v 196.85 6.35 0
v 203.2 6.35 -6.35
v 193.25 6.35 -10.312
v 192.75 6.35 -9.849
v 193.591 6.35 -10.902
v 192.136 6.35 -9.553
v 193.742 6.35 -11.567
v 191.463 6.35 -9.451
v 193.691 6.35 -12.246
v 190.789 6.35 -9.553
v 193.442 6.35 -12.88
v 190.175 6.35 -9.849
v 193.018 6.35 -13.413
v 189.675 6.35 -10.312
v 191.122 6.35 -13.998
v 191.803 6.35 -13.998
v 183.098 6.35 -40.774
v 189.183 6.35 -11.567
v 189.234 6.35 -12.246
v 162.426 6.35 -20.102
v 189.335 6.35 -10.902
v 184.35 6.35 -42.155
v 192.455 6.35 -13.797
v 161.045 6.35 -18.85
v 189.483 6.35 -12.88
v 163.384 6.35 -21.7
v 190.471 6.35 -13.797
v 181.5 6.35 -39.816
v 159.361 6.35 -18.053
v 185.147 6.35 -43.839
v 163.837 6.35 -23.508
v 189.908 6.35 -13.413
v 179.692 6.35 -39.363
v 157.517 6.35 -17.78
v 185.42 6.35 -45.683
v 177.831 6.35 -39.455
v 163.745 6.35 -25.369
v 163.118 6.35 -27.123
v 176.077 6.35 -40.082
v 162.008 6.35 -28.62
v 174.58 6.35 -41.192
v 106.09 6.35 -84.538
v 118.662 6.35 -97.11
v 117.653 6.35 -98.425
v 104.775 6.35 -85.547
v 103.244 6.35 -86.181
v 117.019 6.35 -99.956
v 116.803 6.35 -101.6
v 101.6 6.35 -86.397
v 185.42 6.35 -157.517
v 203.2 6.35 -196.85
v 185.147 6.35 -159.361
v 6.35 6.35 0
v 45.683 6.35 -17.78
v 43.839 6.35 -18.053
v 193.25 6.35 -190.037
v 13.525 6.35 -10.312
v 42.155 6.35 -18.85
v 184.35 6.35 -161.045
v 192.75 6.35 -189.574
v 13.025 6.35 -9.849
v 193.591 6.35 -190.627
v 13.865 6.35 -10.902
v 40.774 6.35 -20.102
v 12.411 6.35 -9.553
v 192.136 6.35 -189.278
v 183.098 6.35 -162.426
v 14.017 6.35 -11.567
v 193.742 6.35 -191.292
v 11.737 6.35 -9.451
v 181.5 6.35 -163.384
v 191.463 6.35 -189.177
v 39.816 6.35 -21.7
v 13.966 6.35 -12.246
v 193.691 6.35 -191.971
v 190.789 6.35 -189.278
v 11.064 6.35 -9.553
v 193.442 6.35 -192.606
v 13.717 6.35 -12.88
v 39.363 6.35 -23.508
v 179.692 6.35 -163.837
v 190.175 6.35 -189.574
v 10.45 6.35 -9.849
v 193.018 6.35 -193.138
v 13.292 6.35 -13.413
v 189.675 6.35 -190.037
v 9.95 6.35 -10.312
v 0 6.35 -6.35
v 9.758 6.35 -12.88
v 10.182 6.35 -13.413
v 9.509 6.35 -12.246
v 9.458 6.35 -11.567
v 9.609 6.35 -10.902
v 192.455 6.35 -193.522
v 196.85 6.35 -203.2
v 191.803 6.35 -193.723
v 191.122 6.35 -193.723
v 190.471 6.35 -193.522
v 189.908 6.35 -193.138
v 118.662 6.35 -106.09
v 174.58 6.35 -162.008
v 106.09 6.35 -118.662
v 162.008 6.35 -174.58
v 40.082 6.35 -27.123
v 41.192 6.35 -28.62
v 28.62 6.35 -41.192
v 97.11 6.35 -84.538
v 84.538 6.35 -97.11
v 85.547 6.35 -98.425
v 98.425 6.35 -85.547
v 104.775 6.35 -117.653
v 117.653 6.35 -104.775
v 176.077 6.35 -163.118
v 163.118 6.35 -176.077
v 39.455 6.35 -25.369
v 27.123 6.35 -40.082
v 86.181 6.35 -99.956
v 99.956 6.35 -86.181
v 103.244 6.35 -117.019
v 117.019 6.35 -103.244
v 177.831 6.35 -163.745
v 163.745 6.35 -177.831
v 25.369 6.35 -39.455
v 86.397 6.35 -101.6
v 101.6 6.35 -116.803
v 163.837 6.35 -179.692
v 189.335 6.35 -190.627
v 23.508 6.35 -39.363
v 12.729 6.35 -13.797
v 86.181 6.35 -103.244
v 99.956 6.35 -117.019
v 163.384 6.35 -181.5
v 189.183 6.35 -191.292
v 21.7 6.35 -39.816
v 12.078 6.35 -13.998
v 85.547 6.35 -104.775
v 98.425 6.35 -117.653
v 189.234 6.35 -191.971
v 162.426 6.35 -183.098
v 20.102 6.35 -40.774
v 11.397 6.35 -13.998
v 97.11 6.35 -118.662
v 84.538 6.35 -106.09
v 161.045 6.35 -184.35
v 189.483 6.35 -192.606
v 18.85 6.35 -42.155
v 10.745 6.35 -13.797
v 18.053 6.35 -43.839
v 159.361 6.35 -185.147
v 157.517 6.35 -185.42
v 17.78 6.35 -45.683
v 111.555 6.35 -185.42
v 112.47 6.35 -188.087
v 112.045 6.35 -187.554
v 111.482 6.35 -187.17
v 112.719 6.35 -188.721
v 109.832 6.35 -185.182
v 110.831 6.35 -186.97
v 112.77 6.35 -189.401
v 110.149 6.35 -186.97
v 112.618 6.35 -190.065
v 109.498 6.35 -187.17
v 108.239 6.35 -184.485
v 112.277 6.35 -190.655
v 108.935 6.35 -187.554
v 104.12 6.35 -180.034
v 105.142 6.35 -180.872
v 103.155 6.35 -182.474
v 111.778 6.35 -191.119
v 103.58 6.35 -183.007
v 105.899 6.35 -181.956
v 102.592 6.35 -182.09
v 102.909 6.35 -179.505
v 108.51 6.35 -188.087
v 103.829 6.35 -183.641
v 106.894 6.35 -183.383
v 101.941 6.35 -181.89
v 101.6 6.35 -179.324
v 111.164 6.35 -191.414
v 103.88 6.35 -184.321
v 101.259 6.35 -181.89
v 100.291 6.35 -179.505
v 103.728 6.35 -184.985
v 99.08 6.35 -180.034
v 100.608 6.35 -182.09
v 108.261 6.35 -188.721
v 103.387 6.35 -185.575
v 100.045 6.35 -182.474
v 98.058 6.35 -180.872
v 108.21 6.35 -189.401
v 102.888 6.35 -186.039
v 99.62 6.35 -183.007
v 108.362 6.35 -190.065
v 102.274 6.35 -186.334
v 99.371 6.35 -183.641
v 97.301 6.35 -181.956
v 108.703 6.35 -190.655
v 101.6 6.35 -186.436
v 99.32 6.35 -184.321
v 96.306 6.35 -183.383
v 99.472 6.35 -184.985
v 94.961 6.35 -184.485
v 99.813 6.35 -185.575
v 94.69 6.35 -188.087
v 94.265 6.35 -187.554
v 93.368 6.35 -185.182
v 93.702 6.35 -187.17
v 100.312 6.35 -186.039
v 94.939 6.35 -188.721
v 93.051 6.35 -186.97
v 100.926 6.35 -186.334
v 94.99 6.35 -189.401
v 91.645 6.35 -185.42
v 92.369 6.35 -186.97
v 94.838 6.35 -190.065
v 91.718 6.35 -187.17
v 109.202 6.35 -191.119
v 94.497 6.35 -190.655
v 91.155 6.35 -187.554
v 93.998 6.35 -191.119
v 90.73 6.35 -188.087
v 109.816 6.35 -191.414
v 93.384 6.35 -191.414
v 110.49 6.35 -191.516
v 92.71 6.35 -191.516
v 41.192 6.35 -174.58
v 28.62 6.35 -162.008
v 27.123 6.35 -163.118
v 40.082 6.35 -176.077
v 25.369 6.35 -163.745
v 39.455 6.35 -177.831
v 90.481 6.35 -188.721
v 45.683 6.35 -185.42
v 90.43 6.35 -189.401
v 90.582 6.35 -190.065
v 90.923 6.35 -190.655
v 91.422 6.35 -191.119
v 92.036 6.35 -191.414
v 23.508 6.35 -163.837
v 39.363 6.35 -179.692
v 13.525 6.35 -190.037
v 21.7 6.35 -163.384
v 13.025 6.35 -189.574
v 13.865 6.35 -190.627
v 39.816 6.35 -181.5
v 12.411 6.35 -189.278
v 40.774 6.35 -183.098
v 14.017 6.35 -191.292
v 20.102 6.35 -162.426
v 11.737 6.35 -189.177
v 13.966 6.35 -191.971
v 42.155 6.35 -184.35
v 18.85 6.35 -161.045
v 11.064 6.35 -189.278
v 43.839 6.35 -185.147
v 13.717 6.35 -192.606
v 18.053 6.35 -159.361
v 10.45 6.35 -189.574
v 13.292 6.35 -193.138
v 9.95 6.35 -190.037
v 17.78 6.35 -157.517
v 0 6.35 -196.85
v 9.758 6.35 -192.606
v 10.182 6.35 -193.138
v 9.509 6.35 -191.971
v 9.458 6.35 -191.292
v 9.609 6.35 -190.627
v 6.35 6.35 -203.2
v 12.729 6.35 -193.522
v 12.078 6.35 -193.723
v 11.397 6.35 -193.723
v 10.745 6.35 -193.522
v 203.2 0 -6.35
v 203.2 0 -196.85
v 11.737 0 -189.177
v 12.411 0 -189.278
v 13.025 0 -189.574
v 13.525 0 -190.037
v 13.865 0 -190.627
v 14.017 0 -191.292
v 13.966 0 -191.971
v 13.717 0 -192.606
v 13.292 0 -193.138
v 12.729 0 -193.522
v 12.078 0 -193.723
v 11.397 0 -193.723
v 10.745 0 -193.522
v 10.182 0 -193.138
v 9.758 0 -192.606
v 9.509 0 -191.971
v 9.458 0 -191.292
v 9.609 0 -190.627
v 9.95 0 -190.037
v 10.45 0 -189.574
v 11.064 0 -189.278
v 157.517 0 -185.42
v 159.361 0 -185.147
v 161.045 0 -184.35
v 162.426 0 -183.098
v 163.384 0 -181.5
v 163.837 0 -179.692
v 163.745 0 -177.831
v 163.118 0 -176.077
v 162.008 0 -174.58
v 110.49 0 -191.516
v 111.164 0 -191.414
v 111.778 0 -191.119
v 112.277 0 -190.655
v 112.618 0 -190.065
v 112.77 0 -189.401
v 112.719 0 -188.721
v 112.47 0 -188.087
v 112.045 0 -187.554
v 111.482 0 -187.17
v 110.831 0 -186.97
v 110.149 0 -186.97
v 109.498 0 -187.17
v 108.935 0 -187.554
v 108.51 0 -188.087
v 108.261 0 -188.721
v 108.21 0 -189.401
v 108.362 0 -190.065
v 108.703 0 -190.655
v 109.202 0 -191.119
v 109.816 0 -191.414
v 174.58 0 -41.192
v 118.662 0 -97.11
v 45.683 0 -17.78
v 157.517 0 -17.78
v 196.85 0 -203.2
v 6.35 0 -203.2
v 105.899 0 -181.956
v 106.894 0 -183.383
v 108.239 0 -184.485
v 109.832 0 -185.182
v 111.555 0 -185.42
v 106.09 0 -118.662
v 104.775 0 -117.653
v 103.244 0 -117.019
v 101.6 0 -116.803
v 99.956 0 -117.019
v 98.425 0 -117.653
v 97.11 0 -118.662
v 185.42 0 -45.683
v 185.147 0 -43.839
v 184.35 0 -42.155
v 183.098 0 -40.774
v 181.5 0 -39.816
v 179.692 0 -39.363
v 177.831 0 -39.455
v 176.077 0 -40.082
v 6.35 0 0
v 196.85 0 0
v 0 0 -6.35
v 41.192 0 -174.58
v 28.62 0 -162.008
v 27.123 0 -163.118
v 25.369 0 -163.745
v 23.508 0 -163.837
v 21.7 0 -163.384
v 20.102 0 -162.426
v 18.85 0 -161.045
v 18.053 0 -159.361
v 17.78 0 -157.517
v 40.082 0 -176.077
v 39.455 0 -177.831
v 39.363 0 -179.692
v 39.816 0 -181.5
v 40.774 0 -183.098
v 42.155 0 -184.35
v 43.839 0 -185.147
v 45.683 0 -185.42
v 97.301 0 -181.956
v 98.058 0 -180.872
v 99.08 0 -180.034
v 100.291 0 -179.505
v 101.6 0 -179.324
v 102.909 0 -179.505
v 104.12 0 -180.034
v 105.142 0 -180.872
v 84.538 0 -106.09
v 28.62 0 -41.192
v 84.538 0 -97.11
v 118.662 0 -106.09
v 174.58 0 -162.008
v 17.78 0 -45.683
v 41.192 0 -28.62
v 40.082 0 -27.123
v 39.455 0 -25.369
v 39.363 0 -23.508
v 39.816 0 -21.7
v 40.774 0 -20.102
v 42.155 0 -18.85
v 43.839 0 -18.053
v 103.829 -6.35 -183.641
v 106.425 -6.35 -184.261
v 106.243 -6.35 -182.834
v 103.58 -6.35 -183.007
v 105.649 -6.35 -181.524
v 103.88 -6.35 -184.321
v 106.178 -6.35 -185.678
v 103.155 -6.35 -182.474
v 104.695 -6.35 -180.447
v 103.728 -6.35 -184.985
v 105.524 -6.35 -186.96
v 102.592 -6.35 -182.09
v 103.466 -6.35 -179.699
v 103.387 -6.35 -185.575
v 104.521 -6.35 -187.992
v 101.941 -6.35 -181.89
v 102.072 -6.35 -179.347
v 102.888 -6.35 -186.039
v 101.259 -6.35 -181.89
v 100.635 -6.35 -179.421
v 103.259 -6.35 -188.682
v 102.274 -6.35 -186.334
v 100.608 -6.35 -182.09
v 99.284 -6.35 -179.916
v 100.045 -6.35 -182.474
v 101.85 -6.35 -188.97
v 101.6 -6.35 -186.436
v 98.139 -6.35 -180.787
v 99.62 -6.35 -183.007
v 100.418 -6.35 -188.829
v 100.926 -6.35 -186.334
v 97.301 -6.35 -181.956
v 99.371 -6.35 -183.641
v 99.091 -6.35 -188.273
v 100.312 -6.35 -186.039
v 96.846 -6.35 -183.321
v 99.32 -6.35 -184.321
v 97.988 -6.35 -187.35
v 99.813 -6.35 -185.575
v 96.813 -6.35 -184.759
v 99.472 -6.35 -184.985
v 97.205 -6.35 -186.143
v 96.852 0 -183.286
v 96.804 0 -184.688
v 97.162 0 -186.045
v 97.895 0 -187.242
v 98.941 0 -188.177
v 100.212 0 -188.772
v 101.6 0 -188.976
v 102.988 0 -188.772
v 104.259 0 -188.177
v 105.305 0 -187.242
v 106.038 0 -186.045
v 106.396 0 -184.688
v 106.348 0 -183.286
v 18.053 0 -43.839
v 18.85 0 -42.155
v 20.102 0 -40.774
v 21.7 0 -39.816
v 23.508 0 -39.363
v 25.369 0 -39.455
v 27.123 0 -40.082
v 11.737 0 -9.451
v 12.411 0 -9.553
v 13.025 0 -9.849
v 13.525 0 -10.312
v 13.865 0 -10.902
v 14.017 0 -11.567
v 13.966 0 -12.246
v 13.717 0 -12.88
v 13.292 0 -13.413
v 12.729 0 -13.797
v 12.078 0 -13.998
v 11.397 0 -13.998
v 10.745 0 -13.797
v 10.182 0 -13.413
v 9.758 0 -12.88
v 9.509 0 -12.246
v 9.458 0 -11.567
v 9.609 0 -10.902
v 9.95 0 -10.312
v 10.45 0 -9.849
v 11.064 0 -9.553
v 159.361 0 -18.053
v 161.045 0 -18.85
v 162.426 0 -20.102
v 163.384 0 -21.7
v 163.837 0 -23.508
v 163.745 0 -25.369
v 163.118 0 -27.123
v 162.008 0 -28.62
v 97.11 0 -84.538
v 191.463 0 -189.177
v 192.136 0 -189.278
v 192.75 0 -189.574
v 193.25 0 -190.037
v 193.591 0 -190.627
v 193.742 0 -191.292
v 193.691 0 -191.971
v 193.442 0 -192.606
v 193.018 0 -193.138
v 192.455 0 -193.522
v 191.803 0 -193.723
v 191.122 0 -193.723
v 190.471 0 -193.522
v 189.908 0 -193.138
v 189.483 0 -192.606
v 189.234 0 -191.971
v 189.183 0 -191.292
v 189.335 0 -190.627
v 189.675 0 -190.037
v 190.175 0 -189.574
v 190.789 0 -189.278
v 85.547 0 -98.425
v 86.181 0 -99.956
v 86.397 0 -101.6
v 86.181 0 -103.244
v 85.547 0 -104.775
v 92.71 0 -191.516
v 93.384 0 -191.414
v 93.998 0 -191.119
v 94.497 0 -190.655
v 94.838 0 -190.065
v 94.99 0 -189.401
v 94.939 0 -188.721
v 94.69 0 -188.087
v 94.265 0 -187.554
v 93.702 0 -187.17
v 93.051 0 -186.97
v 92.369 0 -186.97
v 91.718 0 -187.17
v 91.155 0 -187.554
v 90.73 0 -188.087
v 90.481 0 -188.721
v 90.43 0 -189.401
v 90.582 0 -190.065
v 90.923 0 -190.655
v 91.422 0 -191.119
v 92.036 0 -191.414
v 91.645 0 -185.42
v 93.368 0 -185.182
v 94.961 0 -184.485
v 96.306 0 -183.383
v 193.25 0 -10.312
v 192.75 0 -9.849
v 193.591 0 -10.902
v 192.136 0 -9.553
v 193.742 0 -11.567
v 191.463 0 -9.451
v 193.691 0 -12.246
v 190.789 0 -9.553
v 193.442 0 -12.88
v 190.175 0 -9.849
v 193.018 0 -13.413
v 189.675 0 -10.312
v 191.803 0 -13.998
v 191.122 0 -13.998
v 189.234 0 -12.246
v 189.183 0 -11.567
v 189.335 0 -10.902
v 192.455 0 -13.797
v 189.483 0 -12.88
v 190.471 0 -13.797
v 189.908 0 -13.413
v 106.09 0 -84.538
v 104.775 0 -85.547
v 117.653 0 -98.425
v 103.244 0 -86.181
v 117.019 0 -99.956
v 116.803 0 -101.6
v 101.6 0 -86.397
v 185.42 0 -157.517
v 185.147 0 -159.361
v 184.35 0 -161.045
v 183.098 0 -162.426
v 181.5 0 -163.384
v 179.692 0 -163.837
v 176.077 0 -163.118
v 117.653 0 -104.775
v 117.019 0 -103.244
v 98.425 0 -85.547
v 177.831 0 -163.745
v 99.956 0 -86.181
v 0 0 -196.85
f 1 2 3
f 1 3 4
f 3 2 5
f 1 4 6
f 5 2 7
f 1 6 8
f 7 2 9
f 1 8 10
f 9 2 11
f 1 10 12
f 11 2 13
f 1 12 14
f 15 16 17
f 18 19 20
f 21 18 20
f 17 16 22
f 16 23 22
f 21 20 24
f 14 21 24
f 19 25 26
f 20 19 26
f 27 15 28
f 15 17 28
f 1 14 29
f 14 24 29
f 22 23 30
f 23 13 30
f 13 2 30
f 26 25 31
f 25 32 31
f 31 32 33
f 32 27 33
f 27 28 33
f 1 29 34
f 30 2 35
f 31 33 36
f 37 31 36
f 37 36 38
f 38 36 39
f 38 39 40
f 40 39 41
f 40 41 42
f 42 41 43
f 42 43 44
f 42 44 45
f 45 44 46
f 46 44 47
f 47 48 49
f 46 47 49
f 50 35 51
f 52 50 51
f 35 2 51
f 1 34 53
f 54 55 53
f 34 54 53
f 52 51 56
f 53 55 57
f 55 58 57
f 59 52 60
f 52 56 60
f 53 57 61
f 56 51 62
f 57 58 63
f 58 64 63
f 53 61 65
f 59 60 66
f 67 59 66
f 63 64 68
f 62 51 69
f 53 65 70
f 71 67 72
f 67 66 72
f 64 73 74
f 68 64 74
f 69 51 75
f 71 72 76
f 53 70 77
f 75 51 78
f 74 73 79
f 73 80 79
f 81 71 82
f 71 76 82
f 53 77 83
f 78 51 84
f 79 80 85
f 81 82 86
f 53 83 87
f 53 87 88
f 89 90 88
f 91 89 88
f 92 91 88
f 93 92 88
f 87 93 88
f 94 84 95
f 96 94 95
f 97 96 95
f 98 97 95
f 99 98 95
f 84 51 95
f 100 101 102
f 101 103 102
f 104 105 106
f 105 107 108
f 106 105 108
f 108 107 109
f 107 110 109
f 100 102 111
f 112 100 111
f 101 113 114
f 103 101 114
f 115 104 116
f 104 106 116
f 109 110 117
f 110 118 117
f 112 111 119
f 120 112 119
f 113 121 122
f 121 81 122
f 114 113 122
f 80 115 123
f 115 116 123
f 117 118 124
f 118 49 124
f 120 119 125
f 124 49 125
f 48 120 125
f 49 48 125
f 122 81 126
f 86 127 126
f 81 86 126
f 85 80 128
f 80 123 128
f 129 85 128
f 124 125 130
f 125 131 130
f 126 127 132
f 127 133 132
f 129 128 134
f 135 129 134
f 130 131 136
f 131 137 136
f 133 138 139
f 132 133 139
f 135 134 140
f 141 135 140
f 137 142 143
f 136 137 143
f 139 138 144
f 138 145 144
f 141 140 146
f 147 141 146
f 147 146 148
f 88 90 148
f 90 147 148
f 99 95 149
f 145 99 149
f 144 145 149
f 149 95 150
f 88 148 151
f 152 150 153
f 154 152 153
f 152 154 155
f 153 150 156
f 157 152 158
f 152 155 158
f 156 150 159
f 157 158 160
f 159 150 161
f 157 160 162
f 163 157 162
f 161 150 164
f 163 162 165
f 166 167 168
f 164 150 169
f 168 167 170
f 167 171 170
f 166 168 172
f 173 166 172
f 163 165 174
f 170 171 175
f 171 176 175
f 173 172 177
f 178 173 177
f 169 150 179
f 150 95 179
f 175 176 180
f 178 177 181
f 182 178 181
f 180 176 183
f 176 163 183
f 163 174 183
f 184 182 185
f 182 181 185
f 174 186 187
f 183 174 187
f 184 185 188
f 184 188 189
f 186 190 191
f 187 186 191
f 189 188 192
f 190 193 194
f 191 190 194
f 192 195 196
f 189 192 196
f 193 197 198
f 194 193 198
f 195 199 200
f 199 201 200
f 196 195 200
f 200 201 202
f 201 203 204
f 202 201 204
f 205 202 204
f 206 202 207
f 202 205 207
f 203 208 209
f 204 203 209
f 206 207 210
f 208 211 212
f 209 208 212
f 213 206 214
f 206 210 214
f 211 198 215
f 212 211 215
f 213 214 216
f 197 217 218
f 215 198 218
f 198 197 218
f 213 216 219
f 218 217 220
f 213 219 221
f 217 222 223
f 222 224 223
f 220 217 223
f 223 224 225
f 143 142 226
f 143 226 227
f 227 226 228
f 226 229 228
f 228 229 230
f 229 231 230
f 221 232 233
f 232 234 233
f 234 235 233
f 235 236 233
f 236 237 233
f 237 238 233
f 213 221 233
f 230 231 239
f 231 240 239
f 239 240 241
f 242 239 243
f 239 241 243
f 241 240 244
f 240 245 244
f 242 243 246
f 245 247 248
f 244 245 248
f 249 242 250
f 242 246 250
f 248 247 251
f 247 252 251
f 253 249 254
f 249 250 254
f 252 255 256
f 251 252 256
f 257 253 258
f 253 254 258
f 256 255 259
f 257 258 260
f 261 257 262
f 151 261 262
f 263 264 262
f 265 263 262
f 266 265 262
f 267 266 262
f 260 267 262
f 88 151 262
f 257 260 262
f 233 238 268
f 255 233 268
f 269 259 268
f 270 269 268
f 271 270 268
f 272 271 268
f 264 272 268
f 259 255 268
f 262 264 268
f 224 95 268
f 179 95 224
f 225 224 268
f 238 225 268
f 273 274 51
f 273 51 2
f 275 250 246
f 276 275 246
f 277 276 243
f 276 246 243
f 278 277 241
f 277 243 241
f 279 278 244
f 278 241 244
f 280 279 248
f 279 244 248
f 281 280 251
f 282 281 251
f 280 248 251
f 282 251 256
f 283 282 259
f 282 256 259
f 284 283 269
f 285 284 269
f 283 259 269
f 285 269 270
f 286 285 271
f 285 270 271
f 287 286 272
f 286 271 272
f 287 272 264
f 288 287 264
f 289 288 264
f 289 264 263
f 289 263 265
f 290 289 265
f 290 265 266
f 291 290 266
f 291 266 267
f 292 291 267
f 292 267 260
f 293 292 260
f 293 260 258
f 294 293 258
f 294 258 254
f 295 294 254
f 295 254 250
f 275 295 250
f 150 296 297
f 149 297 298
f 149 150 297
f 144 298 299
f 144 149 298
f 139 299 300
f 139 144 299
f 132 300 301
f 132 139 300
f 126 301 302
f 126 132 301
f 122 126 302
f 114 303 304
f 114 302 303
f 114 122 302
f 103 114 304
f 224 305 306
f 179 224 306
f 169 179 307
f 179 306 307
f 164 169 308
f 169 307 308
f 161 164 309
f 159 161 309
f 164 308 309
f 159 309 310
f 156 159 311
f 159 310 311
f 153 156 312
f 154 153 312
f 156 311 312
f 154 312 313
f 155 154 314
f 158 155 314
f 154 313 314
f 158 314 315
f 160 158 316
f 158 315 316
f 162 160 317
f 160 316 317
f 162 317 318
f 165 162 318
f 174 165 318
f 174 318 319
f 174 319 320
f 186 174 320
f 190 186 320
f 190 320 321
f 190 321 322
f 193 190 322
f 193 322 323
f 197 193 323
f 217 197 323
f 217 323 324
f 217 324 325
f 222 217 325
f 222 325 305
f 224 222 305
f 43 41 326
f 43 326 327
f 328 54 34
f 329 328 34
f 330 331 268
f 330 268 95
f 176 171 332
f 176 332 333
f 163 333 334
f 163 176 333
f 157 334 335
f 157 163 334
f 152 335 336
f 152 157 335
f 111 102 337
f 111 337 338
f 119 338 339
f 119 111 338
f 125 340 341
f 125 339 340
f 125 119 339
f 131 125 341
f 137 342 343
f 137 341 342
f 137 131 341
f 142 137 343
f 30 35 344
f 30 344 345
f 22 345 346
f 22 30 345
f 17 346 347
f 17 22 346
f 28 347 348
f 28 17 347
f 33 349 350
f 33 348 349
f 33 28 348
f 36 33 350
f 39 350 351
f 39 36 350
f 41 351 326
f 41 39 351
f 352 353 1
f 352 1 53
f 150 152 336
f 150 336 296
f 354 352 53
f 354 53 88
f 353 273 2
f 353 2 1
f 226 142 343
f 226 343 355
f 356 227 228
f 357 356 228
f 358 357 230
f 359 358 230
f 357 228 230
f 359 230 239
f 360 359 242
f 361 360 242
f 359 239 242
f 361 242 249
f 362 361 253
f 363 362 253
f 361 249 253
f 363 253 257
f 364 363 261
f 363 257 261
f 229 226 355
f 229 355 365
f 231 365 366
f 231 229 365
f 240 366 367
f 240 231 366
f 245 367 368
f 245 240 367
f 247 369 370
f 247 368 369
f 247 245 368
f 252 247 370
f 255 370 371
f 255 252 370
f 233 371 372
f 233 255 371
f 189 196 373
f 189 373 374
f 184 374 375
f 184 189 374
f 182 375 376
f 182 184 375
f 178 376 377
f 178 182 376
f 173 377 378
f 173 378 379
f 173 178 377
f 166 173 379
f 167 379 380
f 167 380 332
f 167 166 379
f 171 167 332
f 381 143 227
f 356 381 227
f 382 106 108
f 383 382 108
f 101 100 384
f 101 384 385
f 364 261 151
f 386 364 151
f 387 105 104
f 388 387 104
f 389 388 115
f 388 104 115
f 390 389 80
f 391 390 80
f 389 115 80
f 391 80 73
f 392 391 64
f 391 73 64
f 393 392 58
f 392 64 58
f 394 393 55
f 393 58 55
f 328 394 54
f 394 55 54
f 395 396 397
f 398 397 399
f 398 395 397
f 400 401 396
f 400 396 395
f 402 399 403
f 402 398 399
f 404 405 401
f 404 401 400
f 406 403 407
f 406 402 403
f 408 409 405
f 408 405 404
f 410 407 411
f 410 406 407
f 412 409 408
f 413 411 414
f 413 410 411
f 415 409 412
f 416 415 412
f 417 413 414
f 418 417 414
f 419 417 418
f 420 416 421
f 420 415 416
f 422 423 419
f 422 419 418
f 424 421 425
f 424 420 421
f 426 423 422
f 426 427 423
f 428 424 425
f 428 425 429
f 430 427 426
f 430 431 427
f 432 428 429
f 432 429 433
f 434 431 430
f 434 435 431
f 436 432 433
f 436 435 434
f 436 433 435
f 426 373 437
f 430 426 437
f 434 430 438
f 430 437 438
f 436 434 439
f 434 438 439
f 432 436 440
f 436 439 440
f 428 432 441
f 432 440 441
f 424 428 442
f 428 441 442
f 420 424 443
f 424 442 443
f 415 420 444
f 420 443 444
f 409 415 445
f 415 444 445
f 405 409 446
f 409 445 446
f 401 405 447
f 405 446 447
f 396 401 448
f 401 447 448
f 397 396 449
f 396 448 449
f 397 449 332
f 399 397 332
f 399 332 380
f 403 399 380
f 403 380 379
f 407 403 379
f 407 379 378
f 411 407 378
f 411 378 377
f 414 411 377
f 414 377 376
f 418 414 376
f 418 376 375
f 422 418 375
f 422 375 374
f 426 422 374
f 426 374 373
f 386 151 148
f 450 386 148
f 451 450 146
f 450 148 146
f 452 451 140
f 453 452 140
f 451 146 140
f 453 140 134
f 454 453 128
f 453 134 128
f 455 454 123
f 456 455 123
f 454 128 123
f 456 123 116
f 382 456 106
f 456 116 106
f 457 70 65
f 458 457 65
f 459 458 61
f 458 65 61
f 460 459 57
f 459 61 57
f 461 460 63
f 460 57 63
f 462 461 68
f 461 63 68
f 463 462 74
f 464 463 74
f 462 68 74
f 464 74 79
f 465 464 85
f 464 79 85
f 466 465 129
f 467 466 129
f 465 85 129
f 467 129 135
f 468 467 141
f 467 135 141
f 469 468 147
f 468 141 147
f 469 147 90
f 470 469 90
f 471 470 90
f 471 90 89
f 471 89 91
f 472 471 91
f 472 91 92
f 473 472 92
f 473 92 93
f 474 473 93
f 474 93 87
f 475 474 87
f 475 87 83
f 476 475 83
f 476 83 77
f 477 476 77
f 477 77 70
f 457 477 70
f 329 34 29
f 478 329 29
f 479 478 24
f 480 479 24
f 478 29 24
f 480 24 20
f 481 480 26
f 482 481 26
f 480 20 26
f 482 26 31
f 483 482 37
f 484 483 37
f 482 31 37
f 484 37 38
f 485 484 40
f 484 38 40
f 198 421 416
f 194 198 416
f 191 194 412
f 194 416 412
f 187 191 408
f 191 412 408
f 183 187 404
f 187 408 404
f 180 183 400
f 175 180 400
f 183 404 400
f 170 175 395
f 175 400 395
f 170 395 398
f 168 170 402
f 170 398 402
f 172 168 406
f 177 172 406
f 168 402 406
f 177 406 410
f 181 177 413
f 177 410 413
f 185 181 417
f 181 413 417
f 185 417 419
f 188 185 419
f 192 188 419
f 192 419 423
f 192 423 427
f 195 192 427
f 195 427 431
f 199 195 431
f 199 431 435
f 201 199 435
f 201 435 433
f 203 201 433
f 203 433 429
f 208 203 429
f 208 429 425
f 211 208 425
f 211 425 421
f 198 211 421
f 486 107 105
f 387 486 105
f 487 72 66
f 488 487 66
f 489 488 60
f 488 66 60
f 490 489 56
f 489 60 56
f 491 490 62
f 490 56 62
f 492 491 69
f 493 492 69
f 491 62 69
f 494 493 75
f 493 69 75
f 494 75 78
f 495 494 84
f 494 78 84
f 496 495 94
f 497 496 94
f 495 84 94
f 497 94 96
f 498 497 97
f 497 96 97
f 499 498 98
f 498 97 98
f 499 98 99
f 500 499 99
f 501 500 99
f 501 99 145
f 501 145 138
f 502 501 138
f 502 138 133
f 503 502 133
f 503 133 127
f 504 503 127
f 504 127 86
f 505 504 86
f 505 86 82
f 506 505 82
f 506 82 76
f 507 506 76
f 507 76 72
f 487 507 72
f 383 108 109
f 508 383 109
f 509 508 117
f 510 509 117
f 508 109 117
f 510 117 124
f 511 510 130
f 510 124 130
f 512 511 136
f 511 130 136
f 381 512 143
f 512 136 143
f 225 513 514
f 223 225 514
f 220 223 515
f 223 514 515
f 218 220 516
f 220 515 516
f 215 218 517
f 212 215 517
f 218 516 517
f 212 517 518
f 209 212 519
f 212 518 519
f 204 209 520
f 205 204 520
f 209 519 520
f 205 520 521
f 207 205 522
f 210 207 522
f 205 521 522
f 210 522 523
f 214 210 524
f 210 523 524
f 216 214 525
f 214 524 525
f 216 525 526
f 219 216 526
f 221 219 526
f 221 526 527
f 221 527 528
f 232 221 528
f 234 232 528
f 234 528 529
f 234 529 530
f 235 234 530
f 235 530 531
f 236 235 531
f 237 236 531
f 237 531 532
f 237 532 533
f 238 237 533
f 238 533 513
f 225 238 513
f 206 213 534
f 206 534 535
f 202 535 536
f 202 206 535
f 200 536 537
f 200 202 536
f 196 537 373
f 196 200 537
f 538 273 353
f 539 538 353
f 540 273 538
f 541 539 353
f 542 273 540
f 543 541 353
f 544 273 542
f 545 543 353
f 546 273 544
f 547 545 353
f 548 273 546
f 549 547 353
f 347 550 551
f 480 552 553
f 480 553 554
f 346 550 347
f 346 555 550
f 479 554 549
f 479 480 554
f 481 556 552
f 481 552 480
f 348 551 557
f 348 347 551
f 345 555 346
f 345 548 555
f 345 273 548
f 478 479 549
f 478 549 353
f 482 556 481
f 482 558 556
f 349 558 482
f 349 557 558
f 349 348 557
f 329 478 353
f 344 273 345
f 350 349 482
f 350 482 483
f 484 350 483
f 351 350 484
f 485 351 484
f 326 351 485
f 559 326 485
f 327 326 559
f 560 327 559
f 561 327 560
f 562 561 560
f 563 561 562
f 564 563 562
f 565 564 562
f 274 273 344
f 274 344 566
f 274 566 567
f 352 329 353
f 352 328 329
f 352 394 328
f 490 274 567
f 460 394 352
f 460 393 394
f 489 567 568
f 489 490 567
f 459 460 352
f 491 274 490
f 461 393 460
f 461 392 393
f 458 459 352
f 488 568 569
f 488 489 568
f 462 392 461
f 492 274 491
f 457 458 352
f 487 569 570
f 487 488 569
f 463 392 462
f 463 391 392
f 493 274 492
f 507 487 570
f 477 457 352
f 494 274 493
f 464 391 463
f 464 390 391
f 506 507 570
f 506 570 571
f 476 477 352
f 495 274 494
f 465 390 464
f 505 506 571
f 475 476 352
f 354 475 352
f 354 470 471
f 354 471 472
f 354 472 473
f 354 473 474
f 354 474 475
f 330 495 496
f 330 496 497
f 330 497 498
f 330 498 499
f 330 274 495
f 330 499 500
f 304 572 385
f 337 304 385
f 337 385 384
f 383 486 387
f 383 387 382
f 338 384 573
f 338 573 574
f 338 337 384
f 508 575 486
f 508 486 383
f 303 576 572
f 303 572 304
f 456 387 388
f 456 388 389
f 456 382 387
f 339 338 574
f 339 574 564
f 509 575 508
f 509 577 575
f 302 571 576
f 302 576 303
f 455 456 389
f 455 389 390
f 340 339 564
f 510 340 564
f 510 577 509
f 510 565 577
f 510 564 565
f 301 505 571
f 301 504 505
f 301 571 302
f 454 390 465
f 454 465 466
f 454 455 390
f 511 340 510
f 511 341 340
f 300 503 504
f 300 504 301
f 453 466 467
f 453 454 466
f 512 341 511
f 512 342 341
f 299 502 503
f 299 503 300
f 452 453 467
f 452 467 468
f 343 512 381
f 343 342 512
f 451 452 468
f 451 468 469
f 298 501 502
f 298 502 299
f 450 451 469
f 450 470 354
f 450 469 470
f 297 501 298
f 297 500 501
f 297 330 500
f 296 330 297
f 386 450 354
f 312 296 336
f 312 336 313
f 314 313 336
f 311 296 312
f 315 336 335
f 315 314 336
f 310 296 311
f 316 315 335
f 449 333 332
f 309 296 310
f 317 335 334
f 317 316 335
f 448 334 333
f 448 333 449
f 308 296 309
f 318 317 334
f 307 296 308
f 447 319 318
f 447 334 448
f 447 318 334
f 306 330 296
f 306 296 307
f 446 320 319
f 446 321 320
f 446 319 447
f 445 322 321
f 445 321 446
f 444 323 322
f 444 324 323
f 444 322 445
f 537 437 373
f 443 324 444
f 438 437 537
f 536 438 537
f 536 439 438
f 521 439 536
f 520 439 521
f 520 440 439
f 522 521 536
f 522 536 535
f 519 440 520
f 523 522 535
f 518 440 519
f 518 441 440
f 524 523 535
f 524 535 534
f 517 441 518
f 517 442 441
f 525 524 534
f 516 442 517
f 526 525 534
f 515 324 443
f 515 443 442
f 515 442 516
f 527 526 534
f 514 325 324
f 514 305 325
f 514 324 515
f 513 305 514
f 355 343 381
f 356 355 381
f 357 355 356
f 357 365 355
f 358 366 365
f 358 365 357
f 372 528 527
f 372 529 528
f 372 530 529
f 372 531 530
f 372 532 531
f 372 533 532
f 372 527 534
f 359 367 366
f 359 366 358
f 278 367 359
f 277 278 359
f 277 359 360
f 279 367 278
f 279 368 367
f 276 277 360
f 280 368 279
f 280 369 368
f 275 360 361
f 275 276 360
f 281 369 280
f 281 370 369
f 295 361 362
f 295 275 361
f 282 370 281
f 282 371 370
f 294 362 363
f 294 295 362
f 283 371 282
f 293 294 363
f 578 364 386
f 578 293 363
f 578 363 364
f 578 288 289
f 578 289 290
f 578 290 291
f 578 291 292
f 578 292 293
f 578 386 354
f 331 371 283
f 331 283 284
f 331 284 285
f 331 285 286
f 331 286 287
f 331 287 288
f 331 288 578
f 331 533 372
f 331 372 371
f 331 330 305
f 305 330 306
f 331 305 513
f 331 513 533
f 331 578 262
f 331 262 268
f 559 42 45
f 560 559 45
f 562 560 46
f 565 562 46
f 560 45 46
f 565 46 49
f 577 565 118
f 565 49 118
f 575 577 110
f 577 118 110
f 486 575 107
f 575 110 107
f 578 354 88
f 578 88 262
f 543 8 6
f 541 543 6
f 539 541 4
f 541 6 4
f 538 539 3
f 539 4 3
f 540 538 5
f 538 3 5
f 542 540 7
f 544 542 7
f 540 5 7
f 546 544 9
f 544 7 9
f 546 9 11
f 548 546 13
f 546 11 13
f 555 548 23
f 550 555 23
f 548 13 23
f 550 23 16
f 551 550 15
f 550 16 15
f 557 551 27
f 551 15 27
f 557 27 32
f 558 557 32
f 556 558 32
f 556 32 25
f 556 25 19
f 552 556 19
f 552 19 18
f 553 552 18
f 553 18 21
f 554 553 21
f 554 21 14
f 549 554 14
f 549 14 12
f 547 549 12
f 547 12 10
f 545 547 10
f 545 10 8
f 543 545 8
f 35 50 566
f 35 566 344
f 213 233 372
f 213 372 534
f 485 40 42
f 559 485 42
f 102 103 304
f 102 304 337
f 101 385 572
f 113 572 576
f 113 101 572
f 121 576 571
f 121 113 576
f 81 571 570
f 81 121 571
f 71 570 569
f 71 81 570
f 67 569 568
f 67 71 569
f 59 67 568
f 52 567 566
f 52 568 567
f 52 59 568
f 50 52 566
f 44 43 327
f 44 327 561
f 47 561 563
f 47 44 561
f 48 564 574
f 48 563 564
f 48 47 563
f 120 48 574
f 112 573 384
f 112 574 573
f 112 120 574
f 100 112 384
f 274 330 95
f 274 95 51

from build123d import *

# Parameters (mm, degrees)
BOSS_EXTRUDE1_DEPTH = 6.35
CUT_EXTRUDE1_DEPTH  = 288.438345563
SKETCH3_R           = 2.286
CUT_EXTRUDE2_DEPTH  = 288.438345563
BOSS_EXTRUDE2_DEPTH = 6.35
SKETCH5_R           = 4.826
BOSS_EXTRUDE3_DEPTH = 6.35
SKETCH6_R           = 2.286
CUT_EXTRUDE3_DEPTH  = 288.648691984


with BuildPart() as part:
    # Sketch1 → Boss-Extrude1 (new body)
    with BuildSketch(Plane(origin=(0, 0, 0), x_dir=(1, 0, 0), z_dir=(0, 1, 0))):
        Polygon((0, 196.85), (6.35, 203.2), (196.85, 203.2), (203.2, 196.85), (203.2, 6.35), (196.85, 0), (6.35, 0), (0, 6.35), align=None)
    extrude(amount=BOSS_EXTRUDE1_DEPTH)

    # Sketch2 → Cut-Extrude1 (cut, through all)
    with BuildSketch(Plane(origin=(0, 6.35, 0), x_dir=(1, 0, 0), z_dir=(0, 1, 0))):
        with BuildLine():
            Line((45.682614691, 185.42), (157.517385309, 185.42))
            ThreePointArc((157.517385309, 185.42), (163.384020341, 181.500039796), (162.00751337, 174.579871939))
            Line((162.00751337, 174.579871939), (106.090128061, 118.66248663))
            ThreePointArc((106.090128061, 118.66248663), (101.6, 116.802614691), (97.109871939, 118.66248663))
            Line((97.109871939, 118.66248663), (41.19248663, 174.579871939))
            ThreePointArc((41.19248663, 174.579871939), (39.815979659, 181.500039796), (45.682614691, 185.42))
        make_face()
        with BuildLine():
            Line((17.78, 157.517385309), (17.78, 45.682614691))
            ThreePointArc((17.78, 45.682614691), (21.699960204, 39.815979659), (28.620128061, 41.19248663))
            Line((28.620128061, 41.19248663), (84.53751337, 97.109871939))
            ThreePointArc((84.53751337, 97.109871939), (86.397385309, 101.6), (84.53751337, 106.090128061))
            Line((84.53751337, 106.090128061), (28.620128061, 162.00751337))
            ThreePointArc((28.620128061, 162.00751337), (21.699960204, 163.384020341), (17.78, 157.517385309))
        make_face()
        with BuildLine():
            Line((45.682614691, 17.78), (157.517385309, 17.78))
            ThreePointArc((157.517385309, 17.78), (163.384020341, 21.699960204), (162.00751337, 28.620128061))
            Line((162.00751337, 28.620128061), (106.090128061, 84.53751337))
            ThreePointArc((106.090128061, 84.53751337), (101.6, 86.397385309), (97.109871939, 84.53751337))
            Line((97.109871939, 84.53751337), (41.19248663, 28.620128061))
            ThreePointArc((41.19248663, 28.620128061), (39.815979659, 21.699960204), (45.682614691, 17.78))
        make_face()
        with BuildLine():
            Line((185.42, 157.517385309), (185.42, 45.682614691))
            ThreePointArc((185.42, 45.682614691), (181.500039796, 39.815979659), (174.579871939, 41.19248663))
            Line((174.579871939, 41.19248663), (118.66248663, 97.109871939))
            ThreePointArc((118.66248663, 97.109871939), (116.802614691, 101.6), (118.66248663, 106.090128061))
            Line((118.66248663, 106.090128061), (174.579871939, 162.00751337))
            ThreePointArc((174.579871939, 162.00751337), (181.500039796, 163.384020341), (185.42, 157.517385309))
        make_face()
    extrude(amount=-CUT_EXTRUDE1_DEPTH, mode=Mode.SUBTRACT)

    # Sketch3 → Cut-Extrude2 (cut, through all)
    with BuildSketch(Plane(origin=(0, 6.35, 0), x_dir=(1, 0, 0), z_dir=(0, 1, 0))):
        with Locations(Location((11.73734, 11.73734, 0), (0, 0, 270))):
            Circle(SKETCH3_R)
        with Locations(Location((191.46266, 11.73734, 0), (0, 0, 270))):
            Circle(SKETCH3_R)
        with Locations(Location((191.46266, 191.46266, 0), (0, 0, 270))):
            Circle(SKETCH3_R)
        with Locations(Location((11.73734, 191.46266, 0), (0, 0, 270))):
            Circle(SKETCH3_R)
    extrude(amount=-CUT_EXTRUDE2_DEPTH, mode=Mode.SUBTRACT)

    # Sketch4 → Boss-Extrude2 (add)
    with BuildSketch(Plane(origin=(0, 6.35, 0), x_dir=(1, 0, 0), z_dir=(0, 1, 0))):
        with BuildLine():
            Line((111.554726315, 185.42), (91.645273685, 185.42))
            ThreePointArc((91.645273685, 185.42), (94.961453031, 184.485298195), (97.301368182, 181.956363636))
            ThreePointArc((97.301368182, 181.956363636), (101.6, 179.324), (105.898631818, 181.956363636))
            ThreePointArc((105.898631818, 181.956363636), (108.238546969, 184.485298195), (111.554726315, 185.42))
        make_face()
    extrude(amount=-BOSS_EXTRUDE2_DEPTH)

    # Sketch5 → Boss-Extrude3 (add)
    with BuildSketch(Plane.XZ):
        with Locations(Location((101.6, -184.15, 0), (0, 0, 152.964308211))):
            Circle(SKETCH5_R)
    extrude(amount=BOSS_EXTRUDE3_DEPTH)

    # Sketch6 → Cut-Extrude3 (cut, through all)
    with BuildSketch(Plane.XZ.offset(6.35)):
        with Locations(Location((101.6, -184.15, 0), (0, 0, 270))):
            Circle(SKETCH6_R)
        with Locations(Location((92.71, -189.23, 0), (0, 0, 270))):
            Circle(SKETCH6_R)
        with Locations(Location((110.49, -189.23, 0), (0, 0, 270))):
            Circle(SKETCH6_R)
    extrude(amount=-CUT_EXTRUDE3_DEPTH, mode=Mode.SUBTRACT)


solid = part.part
